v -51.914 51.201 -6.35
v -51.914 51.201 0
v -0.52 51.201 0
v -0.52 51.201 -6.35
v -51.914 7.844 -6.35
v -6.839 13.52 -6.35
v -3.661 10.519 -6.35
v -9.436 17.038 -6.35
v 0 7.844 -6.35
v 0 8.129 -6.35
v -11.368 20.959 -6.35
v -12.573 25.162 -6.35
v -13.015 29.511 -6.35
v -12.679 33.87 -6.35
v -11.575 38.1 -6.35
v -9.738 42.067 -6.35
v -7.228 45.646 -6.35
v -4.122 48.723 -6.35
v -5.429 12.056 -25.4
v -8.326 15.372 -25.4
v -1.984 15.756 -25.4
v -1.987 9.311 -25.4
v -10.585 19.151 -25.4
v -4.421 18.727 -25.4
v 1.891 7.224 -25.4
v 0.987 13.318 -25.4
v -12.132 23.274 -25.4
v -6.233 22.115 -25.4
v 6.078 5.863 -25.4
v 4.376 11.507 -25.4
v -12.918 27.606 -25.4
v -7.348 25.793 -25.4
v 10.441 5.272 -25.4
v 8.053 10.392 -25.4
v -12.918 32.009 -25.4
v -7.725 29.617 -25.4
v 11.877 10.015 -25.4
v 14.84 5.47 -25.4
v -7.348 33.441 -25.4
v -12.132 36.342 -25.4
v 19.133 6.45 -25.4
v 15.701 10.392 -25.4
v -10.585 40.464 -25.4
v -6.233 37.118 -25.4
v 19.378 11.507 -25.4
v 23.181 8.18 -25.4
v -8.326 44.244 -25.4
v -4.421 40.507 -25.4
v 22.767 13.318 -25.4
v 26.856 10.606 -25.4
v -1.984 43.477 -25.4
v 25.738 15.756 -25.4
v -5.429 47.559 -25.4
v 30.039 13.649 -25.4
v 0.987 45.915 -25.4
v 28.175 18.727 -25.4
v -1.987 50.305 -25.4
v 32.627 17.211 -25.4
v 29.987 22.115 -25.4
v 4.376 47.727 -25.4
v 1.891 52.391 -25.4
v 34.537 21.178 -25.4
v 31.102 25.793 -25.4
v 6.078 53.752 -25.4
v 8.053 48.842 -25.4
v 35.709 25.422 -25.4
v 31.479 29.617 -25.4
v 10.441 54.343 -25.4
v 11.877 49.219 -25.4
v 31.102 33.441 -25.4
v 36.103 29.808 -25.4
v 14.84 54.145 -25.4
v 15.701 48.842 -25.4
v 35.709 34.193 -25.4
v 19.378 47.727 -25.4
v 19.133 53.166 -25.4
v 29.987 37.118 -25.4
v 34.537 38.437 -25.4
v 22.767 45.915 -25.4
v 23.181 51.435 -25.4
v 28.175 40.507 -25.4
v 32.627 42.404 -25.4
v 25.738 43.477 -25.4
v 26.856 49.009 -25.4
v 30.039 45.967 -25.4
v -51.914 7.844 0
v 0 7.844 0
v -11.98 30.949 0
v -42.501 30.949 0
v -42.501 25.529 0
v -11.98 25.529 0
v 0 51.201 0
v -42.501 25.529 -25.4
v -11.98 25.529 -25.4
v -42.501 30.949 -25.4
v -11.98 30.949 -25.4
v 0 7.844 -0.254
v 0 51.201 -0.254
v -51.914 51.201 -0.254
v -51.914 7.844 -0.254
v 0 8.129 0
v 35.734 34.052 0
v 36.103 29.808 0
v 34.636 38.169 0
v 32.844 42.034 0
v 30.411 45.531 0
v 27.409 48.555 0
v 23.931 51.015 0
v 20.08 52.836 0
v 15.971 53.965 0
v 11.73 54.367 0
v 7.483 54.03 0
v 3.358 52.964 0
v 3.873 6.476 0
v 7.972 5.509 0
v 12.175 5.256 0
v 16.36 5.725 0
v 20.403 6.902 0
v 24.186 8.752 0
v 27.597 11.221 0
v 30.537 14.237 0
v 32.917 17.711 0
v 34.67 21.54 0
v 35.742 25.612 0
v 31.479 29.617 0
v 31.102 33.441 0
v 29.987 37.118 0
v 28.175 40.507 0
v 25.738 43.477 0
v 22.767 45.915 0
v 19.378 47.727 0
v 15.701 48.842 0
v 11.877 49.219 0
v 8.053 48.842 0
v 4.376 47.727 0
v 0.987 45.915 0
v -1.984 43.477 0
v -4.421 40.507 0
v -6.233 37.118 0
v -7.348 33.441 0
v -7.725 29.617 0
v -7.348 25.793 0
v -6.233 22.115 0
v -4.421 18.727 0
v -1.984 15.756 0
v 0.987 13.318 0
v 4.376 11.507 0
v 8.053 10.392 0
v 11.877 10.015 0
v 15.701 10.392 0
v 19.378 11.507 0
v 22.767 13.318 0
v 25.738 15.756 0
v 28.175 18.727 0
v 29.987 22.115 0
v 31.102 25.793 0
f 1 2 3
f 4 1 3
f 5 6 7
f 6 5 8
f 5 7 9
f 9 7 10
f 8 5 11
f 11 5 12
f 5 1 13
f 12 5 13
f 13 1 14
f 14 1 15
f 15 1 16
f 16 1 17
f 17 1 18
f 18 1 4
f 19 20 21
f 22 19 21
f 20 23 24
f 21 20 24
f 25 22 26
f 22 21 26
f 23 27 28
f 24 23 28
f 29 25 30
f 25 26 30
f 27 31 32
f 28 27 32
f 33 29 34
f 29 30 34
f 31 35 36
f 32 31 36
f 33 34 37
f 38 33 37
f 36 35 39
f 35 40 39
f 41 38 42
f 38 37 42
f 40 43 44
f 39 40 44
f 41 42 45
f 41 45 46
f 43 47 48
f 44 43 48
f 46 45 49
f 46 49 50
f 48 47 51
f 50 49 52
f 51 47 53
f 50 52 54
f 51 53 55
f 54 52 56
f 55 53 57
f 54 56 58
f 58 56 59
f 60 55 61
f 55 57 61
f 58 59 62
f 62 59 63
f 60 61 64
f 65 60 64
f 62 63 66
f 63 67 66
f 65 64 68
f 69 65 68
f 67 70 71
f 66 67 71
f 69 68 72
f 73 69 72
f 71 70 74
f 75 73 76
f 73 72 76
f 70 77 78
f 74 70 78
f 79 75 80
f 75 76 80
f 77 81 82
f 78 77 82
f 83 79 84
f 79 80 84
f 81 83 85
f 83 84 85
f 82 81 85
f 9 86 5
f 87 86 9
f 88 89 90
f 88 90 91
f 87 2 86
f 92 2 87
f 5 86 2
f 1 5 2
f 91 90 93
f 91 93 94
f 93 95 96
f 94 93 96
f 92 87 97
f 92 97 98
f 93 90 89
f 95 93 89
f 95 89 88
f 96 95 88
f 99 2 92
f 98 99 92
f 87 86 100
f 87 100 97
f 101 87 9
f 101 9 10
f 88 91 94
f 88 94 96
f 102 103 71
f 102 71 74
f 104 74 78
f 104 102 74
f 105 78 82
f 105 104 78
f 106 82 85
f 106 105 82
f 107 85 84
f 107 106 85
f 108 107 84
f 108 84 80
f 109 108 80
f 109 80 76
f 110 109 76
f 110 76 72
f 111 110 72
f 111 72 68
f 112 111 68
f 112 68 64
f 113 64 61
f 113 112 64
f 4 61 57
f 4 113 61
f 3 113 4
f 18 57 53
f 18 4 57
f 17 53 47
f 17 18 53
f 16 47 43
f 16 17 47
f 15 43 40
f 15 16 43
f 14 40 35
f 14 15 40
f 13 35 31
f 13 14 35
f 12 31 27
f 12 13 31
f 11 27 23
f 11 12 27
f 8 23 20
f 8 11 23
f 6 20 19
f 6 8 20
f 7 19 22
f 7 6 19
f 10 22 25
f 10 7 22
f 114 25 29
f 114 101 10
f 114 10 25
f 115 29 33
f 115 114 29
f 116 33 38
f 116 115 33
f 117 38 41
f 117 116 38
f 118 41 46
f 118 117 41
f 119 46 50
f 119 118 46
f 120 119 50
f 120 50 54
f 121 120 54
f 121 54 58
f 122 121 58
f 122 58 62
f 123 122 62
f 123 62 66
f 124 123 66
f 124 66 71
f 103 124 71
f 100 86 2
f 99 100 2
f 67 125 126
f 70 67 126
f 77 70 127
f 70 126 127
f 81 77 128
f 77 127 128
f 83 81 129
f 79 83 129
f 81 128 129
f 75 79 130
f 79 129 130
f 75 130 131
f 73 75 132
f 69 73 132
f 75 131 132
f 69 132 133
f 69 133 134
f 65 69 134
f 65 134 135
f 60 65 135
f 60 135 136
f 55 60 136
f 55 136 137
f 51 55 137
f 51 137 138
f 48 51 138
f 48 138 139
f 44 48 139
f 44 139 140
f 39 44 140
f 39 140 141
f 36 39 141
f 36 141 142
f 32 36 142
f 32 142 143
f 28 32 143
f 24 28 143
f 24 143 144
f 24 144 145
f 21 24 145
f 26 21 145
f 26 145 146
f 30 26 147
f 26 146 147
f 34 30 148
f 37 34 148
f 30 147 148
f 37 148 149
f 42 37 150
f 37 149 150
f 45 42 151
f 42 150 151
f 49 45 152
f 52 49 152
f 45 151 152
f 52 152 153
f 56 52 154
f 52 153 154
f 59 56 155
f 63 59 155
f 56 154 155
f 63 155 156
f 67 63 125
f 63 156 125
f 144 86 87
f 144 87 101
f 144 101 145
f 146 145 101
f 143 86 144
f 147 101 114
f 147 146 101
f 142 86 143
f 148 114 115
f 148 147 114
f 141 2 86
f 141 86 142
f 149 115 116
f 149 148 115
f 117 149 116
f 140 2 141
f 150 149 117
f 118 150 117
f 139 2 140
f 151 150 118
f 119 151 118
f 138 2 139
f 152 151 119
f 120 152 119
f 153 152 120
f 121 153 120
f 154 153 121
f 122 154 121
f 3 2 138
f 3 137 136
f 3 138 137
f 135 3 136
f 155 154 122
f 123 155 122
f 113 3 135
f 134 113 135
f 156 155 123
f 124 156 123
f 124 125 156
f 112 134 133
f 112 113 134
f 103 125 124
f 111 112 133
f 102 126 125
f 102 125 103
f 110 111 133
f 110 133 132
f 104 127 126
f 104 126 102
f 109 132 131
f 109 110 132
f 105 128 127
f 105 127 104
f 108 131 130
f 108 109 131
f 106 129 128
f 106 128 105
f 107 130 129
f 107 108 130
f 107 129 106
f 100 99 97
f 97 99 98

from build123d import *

# Parameters (mm, degrees)
F0_W     = 51.9137978554
F0_H     = 43.3565778658
F1_DEPTH = 6.35
F2_R     = 24.5600108098
F3_DEPTH = 25.4
F4_R     = 19.6018385594
F5_DEPTH = 43.18
F6_DEPTH = 0.254
F7_W     = 30.5207502097
F7_H     = 5.4195709527
F8_DEPTH = 25.4


# Not quite as in the source:
# - a feature of the source that left no trace in its solid (it failed there, or was rolled back) is left out


with BuildPart() as f1:
    # F0 (on Top) → F1 (new body)
    with BuildSketch(Plane.XY):
        with Locations((-25.9568989277, 29.522406403)):
            Rectangle(F0_W, F0_H)
    extrude(amount=-F1_DEPTH)

    # F2 (on Top) → F3 (join)
    with BuildSketch(Plane.XY):
        with Locations((11.5432187769, 29.8076476902)):
            Circle(F2_R)
    extrude(amount=-F3_DEPTH)

    # F4 (on Top) → F5 (cut)
    with BuildSketch(Plane.XY):
        with Locations((11.8770356263, 29.6167964683)):
            Circle(F4_R)
    extrude(amount=-F5_DEPTH, mode=Mode.SUBTRACT)


with BuildPart() as f6:
    # F0 (on Top) → F6 (new body)
    with BuildSketch(Plane.XY):
        with Locations((-25.9568989277, 29.522406403)):
            Rectangle(F0_W, F0_H)
    extrude(amount=-F6_DEPTH)


with BuildPart() as f8:
    # F7 (on Top) → F8 (new body)
    with BuildSketch(Plane.XY):
        with Locations((-27.240482159, 28.2388236374)):
            Rectangle(F7_W, F7_H)
    extrude(amount=-F8_DEPTH)


solid = Compound([f1.part, f6.part, f8.part])
